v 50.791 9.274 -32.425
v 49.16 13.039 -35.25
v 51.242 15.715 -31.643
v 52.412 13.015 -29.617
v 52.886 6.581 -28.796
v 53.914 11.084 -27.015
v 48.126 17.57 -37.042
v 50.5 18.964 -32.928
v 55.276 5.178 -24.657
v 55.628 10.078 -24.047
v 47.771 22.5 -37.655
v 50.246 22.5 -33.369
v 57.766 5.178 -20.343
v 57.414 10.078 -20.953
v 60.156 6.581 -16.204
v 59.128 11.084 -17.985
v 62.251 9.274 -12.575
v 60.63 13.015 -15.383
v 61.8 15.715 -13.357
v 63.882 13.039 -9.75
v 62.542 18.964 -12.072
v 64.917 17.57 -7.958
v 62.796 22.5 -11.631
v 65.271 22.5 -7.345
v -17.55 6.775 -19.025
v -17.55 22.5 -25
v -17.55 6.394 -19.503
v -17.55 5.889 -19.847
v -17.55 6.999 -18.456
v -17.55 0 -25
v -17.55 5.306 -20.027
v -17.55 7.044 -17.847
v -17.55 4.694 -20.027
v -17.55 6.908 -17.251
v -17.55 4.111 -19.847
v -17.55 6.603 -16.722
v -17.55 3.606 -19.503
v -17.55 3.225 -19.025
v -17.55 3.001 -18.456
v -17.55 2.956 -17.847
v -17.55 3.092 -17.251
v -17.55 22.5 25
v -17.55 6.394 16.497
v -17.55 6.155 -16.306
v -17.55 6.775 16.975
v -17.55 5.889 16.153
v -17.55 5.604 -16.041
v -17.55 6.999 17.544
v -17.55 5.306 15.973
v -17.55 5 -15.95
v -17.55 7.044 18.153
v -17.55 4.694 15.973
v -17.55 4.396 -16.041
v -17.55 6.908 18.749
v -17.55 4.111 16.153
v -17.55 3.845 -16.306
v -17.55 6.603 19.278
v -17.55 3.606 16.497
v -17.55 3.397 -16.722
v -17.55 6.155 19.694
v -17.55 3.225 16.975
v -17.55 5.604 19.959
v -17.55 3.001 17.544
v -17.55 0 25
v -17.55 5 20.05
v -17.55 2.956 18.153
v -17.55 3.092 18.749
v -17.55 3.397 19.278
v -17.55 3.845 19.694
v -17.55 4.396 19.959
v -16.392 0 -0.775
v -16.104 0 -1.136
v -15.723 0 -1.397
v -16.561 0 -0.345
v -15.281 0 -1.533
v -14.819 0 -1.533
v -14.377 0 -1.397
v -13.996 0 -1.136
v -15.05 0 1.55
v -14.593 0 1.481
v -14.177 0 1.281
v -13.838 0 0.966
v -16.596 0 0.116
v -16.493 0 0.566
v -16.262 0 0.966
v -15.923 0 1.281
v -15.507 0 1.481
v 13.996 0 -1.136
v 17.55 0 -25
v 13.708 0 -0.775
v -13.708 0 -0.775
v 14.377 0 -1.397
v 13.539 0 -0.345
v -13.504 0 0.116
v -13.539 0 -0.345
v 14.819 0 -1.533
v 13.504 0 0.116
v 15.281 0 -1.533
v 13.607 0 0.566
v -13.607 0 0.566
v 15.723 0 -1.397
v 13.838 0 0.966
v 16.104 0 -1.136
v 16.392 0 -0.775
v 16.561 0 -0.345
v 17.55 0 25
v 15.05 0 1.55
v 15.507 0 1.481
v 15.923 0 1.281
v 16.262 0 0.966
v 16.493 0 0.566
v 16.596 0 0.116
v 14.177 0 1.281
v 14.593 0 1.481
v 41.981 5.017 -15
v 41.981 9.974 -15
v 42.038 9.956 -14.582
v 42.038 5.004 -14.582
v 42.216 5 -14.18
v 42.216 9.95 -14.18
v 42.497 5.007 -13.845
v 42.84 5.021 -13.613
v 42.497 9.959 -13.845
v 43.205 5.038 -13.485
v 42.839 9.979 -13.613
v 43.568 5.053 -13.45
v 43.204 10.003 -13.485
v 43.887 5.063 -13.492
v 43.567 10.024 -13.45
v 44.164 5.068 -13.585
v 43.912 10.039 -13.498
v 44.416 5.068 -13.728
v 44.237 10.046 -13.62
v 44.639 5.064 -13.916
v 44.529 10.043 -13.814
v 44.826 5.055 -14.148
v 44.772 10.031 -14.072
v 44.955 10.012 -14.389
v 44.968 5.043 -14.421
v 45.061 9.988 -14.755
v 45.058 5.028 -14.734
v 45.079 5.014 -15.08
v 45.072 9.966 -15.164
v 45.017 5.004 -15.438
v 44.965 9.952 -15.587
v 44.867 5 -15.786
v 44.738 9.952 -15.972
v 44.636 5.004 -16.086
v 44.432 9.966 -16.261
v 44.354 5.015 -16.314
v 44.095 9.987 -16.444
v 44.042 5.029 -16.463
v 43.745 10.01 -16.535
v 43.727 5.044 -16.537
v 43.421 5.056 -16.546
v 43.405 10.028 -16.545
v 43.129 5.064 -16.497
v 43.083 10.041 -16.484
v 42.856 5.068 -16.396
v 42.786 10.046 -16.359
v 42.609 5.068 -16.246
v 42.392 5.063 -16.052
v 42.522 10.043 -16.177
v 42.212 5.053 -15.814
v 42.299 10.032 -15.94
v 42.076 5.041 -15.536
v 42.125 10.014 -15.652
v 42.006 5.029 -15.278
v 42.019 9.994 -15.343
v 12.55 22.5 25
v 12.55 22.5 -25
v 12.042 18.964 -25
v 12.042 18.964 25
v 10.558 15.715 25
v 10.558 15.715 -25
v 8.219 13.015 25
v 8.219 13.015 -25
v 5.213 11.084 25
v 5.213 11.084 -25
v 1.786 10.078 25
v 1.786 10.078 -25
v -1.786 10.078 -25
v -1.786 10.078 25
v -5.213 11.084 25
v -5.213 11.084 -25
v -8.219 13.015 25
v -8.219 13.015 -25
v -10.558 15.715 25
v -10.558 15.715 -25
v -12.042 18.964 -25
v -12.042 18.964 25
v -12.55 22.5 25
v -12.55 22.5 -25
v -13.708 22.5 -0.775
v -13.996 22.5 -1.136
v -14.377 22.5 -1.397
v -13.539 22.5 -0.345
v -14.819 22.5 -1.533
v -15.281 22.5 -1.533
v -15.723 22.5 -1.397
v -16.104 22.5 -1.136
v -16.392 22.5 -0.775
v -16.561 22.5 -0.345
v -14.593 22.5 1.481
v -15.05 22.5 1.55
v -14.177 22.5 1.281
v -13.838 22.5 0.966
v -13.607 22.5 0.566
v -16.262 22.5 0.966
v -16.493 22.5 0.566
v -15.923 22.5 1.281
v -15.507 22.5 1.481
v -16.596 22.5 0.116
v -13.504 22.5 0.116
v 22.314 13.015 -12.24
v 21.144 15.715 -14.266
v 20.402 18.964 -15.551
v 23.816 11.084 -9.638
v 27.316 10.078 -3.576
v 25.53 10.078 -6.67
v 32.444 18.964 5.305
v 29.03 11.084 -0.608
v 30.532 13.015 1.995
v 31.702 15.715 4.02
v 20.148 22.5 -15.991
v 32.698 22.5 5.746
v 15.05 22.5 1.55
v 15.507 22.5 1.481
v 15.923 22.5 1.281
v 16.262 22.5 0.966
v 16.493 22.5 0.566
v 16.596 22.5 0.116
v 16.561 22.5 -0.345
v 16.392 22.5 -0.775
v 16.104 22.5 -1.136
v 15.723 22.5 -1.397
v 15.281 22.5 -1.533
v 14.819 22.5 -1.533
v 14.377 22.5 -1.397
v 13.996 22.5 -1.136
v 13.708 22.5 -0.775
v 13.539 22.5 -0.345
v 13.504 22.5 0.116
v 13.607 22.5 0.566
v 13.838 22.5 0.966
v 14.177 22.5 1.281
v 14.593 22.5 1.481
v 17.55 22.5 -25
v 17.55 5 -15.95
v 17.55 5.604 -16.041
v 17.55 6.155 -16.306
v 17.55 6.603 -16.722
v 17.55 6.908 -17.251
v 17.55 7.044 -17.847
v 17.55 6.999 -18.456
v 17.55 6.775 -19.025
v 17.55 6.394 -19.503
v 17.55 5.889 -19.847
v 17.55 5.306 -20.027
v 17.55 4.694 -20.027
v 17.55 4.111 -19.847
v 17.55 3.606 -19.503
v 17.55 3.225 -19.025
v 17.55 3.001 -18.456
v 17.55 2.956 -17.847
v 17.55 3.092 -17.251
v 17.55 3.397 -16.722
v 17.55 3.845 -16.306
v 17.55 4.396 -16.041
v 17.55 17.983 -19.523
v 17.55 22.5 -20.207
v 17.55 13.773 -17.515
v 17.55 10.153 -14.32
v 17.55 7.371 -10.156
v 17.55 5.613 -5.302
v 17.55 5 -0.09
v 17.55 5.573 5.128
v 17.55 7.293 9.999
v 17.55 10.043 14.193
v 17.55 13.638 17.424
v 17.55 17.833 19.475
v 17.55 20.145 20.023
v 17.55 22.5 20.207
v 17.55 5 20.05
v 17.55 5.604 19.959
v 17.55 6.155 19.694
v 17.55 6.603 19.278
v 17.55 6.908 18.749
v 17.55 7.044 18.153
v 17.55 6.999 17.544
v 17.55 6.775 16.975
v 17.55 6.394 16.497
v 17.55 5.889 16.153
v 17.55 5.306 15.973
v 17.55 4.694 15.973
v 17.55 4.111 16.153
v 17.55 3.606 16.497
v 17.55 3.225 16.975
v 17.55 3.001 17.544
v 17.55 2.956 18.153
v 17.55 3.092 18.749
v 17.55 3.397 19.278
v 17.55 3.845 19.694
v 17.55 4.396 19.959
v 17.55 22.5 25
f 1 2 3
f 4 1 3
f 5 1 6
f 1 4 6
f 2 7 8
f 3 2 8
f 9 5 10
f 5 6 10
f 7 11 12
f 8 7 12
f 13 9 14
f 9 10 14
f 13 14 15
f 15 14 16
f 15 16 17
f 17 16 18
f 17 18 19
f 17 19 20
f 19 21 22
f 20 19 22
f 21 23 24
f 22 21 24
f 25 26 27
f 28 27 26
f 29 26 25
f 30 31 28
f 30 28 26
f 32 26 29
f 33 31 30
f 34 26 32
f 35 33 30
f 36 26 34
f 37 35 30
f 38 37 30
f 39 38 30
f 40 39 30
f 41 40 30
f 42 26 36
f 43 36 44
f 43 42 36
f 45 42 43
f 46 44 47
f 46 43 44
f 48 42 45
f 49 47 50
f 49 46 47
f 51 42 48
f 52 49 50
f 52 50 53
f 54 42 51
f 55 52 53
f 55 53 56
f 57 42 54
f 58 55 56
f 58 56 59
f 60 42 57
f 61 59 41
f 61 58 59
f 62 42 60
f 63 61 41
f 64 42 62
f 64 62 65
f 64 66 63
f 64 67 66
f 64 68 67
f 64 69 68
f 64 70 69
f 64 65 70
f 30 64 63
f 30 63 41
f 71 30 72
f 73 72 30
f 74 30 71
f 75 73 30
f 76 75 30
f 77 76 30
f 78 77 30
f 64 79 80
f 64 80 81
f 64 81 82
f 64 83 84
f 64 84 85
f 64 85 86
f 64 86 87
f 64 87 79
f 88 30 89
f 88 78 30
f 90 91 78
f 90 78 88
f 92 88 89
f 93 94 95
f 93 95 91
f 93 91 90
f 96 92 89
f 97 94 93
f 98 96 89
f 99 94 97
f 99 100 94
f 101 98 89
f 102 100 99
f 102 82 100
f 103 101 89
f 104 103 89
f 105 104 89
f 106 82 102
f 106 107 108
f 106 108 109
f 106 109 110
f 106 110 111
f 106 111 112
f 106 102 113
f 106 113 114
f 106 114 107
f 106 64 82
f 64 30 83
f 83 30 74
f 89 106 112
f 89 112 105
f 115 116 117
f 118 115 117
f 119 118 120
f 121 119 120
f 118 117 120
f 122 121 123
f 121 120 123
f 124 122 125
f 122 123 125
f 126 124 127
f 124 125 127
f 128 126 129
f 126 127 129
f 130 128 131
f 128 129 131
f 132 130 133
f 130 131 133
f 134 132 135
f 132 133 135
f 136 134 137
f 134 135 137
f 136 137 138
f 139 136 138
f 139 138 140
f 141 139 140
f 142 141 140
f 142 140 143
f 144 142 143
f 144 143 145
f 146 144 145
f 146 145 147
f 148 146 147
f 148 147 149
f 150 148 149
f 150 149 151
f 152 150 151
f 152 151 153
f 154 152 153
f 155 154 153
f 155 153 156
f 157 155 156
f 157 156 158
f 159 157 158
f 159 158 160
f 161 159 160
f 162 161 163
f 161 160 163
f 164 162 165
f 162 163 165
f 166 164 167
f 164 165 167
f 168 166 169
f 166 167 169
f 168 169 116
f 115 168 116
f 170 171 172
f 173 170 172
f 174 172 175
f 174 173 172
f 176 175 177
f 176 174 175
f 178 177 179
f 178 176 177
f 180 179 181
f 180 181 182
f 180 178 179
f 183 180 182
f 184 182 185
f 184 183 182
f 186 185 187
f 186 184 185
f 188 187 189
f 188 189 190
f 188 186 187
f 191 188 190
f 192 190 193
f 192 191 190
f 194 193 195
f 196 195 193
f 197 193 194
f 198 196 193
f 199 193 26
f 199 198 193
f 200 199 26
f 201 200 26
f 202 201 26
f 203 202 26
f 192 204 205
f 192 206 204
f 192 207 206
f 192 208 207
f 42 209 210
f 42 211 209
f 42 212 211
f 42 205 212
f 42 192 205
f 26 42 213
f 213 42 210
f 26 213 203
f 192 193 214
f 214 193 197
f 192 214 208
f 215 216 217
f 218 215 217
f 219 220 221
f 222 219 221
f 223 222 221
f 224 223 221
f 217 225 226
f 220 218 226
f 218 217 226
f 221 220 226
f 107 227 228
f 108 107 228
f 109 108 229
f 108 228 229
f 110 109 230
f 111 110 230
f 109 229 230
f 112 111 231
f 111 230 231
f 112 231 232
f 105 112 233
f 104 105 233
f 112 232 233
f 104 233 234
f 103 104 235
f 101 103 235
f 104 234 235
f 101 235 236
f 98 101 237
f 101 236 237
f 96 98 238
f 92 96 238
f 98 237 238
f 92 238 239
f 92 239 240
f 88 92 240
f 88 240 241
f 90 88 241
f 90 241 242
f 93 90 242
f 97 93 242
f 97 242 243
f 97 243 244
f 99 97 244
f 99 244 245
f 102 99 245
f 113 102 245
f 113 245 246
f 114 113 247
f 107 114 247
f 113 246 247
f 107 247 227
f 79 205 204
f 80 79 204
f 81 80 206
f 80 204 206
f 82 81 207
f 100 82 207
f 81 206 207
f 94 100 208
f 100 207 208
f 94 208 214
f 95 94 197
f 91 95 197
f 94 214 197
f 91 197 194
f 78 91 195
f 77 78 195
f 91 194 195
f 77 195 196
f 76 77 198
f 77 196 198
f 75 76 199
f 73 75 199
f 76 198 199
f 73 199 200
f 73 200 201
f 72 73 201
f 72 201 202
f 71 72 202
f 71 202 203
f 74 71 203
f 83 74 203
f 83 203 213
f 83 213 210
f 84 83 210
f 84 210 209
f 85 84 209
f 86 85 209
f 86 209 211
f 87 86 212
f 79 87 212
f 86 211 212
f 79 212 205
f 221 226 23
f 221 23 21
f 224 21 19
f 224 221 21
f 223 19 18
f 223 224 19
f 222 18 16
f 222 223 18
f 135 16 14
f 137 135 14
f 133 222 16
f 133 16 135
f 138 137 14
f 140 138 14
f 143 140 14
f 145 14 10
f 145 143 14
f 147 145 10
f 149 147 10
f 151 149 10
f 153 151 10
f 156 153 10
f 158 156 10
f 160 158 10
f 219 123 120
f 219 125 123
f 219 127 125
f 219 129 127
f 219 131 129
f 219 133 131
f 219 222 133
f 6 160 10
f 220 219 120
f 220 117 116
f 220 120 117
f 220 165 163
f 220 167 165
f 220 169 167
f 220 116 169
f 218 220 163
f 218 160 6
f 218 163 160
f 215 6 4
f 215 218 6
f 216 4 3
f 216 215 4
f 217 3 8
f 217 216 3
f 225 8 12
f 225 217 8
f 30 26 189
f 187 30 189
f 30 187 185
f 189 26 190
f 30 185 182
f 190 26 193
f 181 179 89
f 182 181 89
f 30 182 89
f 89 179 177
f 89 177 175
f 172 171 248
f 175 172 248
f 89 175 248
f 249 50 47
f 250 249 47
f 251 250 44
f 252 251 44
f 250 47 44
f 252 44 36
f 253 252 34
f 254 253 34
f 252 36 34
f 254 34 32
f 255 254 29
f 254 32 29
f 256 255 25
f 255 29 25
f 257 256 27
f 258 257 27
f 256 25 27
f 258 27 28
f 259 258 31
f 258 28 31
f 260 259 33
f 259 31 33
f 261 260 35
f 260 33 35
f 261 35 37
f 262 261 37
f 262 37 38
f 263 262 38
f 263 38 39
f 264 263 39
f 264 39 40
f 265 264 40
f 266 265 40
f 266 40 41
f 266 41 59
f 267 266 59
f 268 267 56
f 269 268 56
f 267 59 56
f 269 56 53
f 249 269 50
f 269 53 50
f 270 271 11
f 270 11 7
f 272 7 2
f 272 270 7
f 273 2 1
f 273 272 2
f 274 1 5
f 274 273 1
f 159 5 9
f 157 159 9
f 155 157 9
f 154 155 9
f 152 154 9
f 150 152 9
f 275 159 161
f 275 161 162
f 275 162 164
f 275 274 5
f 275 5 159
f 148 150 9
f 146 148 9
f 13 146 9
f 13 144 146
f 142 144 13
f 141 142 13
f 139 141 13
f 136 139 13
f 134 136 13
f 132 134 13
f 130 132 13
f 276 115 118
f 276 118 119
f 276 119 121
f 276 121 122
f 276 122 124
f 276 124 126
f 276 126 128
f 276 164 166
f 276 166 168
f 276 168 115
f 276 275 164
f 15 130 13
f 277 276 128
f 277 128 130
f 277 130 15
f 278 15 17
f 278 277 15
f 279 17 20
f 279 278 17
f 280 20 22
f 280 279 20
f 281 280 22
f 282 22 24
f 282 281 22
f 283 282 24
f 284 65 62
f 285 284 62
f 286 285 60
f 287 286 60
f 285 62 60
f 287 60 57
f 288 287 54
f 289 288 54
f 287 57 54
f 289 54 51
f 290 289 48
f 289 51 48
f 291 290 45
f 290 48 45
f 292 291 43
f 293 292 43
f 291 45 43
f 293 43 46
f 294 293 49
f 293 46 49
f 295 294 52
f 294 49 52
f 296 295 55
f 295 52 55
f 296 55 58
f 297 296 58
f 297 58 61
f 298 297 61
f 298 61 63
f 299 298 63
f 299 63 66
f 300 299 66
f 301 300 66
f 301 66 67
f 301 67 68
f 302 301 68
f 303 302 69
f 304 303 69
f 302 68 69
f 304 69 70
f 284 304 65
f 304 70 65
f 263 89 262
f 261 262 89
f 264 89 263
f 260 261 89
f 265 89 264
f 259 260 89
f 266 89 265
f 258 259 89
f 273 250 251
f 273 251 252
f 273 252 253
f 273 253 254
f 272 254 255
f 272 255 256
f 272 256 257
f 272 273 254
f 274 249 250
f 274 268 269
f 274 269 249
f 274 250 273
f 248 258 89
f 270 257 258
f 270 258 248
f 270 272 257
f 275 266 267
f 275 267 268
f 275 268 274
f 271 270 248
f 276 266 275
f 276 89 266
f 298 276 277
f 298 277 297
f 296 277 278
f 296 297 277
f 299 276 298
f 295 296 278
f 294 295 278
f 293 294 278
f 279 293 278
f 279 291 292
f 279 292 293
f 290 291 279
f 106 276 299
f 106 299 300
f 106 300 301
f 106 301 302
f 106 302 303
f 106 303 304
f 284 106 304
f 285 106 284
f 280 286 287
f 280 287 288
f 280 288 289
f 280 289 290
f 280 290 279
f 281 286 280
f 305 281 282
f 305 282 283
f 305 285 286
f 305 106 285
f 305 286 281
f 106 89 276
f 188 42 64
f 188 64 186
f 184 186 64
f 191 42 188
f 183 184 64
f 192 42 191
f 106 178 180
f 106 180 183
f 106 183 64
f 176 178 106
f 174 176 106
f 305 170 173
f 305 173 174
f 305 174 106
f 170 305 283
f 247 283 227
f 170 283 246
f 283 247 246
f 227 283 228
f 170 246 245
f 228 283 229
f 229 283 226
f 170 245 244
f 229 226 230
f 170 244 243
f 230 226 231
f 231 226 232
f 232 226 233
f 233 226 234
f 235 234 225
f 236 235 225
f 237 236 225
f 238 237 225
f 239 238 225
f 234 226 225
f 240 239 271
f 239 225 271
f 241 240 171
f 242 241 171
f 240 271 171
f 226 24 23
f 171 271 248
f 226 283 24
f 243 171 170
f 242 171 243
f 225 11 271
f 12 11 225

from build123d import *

# Parameters (mm, degrees)
BOSS_EXTRUDE1_DEPTH             = 25
SKETCH2_R                       = 1.55
CUT_EXTRUDE1_DEPTH              = 22.5
BOSS_EXTRUDE2_REACH             = 65.436
BOSS_EXTRUDE2_DIRECTION_2_DEPTH = 30
CUT_EXTRUDE2_REACH              = 80.642
CUT_EXTRUDE2_END_RADIUS         = 17.5
SKETCH7_R                       = 1.55
SKETCH9_R                       = 2.05
CUT_EXTRUDE3_DEPTH              = 35.1
BOSS_EXTRUDE5_REACH             = 63.632


with BuildPart() as part:
    # Sketch1 → Boss-Extrude1 (new, symmetric)
    with BuildSketch(Plane.XY):
        with BuildLine():
            Line((-17.55, 22.5), (-17.55, 0))
            Line((-17.55, 0), (17.55, 0))
            Line((17.55, 0), (17.55, 22.5))
            Line((17.55, 22.5), (12.55, 22.5))
            ThreePointArc((12.55, 22.5), (0, 9.95), (-12.55, 22.5))
            Line((-12.55, 22.5), (-17.55, 22.5))
        make_face()
    extrude(amount=BOSS_EXTRUDE1_DEPTH, both=True)

    # Sketch2 → Cut-Extrude1 (cut)
    with BuildSketch(Plane(origin=(0, 22.5, 0), x_dir=(1, 0, 0), z_dir=(0, 1, 0))):
        with Locations(Location((-15.05, 0, 0), (0, 0, 270))):
            Circle(SKETCH2_R)
        with Locations(Location((15.05, 0, 0), (0, 0, 270))):
            Circle(SKETCH2_R)
    extrude(amount=-CUT_EXTRUDE1_DEPTH, mode=Mode.SUBTRACT)

    # Boss-Extrude2: up to this plane
    boss_extrude2_end = Plane(origin=(17.55, 0, 25), z_dir=(-1, 0, 0))
    # Sketch5 → Boss-Extrude2 (add, up to the surface)
    with BuildSketch(Plane(origin=(26.152881057, 0, -15.099372918), x_dir=(-0.5000000000000013, 0, -0.8660254037844379), z_dir=(0.8660254037844379, 0, -0.5000000000000013)), mode=Mode.PRIVATE) as boss_extrude2_sk1:
        with BuildLine():
            Line((-26.275, 22.5), (-21.325, 22.5))
            ThreePointArc((-21.325, 22.5), (-8.775, 9.95), (3.775, 22.5))
            Line((3.775, 22.5), (8.725, 22.5))
            ThreePointArc((8.725, 22.5), (-8.775, 5), (-26.275, 22.5))
        make_face()
    boss_extrude2_tool1 = split(extrude(boss_extrude2_sk1.sketch, amount=-BOSS_EXTRUDE2_REACH, mode=Mode.PRIVATE), bisect_by=boss_extrude2_end, keep=Keep.BOTH, mode=Mode.PRIVATE)
    add(boss_extrude2_tool1.solids().sort_by_distance((38.052881, 22.108688, 5.512032))[0])

    # Sketch5 → Boss-Extrude2 direction 2 (add)
    with BuildSketch(Plane(origin=(26.152881057, 0, -15.099372918), x_dir=(-0.5000000000000013, 0, -0.8660254037844379), z_dir=(0.8660254037844379, 0, -0.5000000000000013))):
        with BuildLine():
            Line((-26.275, 22.5), (-21.325, 22.5))
            ThreePointArc((-21.325, 22.5), (-8.775, 9.95), (3.775, 22.5))
            Line((3.775, 22.5), (8.725, 22.5))
            ThreePointArc((8.725, 22.5), (-8.775, 5), (-26.275, 22.5))
        make_face()
    extrude(amount=BOSS_EXTRUDE2_DIRECTION_2_DEPTH)

    # Cut-Extrude2: up to this cylinder (the profile starts inside it)
    cut_extrude2_end = Plane(origin=(43.530762028, 22.5, -14.999999951), z_dir=(-0.8660254037844379, 0, 0.5000000000000013)) * Cylinder(CUT_EXTRUDE2_END_RADIUS, 197.284, mode=Mode.PRIVATE)
    # Sketch7 → Cut-Extrude2 (cut, up to the surface)
    with BuildSketch(Plane(origin=(0, 22.5, 0), x_dir=(1, 0, 0), z_dir=(0, 1, 0)), mode=Mode.PRIVATE) as cut_extrude2_sk1:
        with Locations(Location((43.530762114, 15, 0), (0, 0, 180))):
            Circle(SKETCH7_R)
    cut_extrude2_tool1 = extrude(cut_extrude2_sk1.sketch, amount=-CUT_EXTRUDE2_REACH, mode=Mode.PRIVATE) & cut_extrude2_end
    add(cut_extrude2_tool1.solids().sort_by_distance((43.530762, 22.5, -15))[0], mode=Mode.SUBTRACT)

    # Sketch9 → Cut-Extrude3 (cut)
    with BuildSketch(Plane.ZY.offset(17.55)):
        with Locations((-18, 5)):
            Circle(SKETCH9_R)
        with Locations((18, 5)):
            Circle(SKETCH9_R)
    extrude(amount=-CUT_EXTRUDE3_DEPTH, mode=Mode.SUBTRACT)

    # Boss-Extrude5: up to this face of the body (flat: up to its plane)
    boss_extrude5_end = Plane(part.part.faces().sort_by_distance((17.55, 17.173614571, 0))[0])
    # Sketch12 → Boss-Extrude5 (add, up to the picked face)
    with BuildSketch(Plane(origin=(22.035576211, 0, -12.722245857), x_dir=(-0.4999999999999781, 0, -0.8660254037844513), z_dir=(0.8660254037844513, 0, -0.4999999999999781)), mode=Mode.PRIVATE) as boss_extrude5_sk1:
        with BuildLine():
            Line((-21.325, 22.5), (3.775, 22.5))
            ThreePointArc((3.775, 22.5), (-8.775, 9.95), (-21.325, 22.5))
        make_face()
    boss_extrude5_tool1 = split(extrude(boss_extrude5_sk1.sketch, amount=-BOSS_EXTRUDE5_REACH, mode=Mode.PRIVATE), bisect_by=boss_extrude5_end, keep=Keep.BOTH, mode=Mode.PRIVATE)
    add(boss_extrude5_tool1.solids().sort_by(Axis((26.423076, 17.173615, -5.122873), (-0.8660254037844513, 0, 0.4999999999999781)))[0])


solid = part.part
